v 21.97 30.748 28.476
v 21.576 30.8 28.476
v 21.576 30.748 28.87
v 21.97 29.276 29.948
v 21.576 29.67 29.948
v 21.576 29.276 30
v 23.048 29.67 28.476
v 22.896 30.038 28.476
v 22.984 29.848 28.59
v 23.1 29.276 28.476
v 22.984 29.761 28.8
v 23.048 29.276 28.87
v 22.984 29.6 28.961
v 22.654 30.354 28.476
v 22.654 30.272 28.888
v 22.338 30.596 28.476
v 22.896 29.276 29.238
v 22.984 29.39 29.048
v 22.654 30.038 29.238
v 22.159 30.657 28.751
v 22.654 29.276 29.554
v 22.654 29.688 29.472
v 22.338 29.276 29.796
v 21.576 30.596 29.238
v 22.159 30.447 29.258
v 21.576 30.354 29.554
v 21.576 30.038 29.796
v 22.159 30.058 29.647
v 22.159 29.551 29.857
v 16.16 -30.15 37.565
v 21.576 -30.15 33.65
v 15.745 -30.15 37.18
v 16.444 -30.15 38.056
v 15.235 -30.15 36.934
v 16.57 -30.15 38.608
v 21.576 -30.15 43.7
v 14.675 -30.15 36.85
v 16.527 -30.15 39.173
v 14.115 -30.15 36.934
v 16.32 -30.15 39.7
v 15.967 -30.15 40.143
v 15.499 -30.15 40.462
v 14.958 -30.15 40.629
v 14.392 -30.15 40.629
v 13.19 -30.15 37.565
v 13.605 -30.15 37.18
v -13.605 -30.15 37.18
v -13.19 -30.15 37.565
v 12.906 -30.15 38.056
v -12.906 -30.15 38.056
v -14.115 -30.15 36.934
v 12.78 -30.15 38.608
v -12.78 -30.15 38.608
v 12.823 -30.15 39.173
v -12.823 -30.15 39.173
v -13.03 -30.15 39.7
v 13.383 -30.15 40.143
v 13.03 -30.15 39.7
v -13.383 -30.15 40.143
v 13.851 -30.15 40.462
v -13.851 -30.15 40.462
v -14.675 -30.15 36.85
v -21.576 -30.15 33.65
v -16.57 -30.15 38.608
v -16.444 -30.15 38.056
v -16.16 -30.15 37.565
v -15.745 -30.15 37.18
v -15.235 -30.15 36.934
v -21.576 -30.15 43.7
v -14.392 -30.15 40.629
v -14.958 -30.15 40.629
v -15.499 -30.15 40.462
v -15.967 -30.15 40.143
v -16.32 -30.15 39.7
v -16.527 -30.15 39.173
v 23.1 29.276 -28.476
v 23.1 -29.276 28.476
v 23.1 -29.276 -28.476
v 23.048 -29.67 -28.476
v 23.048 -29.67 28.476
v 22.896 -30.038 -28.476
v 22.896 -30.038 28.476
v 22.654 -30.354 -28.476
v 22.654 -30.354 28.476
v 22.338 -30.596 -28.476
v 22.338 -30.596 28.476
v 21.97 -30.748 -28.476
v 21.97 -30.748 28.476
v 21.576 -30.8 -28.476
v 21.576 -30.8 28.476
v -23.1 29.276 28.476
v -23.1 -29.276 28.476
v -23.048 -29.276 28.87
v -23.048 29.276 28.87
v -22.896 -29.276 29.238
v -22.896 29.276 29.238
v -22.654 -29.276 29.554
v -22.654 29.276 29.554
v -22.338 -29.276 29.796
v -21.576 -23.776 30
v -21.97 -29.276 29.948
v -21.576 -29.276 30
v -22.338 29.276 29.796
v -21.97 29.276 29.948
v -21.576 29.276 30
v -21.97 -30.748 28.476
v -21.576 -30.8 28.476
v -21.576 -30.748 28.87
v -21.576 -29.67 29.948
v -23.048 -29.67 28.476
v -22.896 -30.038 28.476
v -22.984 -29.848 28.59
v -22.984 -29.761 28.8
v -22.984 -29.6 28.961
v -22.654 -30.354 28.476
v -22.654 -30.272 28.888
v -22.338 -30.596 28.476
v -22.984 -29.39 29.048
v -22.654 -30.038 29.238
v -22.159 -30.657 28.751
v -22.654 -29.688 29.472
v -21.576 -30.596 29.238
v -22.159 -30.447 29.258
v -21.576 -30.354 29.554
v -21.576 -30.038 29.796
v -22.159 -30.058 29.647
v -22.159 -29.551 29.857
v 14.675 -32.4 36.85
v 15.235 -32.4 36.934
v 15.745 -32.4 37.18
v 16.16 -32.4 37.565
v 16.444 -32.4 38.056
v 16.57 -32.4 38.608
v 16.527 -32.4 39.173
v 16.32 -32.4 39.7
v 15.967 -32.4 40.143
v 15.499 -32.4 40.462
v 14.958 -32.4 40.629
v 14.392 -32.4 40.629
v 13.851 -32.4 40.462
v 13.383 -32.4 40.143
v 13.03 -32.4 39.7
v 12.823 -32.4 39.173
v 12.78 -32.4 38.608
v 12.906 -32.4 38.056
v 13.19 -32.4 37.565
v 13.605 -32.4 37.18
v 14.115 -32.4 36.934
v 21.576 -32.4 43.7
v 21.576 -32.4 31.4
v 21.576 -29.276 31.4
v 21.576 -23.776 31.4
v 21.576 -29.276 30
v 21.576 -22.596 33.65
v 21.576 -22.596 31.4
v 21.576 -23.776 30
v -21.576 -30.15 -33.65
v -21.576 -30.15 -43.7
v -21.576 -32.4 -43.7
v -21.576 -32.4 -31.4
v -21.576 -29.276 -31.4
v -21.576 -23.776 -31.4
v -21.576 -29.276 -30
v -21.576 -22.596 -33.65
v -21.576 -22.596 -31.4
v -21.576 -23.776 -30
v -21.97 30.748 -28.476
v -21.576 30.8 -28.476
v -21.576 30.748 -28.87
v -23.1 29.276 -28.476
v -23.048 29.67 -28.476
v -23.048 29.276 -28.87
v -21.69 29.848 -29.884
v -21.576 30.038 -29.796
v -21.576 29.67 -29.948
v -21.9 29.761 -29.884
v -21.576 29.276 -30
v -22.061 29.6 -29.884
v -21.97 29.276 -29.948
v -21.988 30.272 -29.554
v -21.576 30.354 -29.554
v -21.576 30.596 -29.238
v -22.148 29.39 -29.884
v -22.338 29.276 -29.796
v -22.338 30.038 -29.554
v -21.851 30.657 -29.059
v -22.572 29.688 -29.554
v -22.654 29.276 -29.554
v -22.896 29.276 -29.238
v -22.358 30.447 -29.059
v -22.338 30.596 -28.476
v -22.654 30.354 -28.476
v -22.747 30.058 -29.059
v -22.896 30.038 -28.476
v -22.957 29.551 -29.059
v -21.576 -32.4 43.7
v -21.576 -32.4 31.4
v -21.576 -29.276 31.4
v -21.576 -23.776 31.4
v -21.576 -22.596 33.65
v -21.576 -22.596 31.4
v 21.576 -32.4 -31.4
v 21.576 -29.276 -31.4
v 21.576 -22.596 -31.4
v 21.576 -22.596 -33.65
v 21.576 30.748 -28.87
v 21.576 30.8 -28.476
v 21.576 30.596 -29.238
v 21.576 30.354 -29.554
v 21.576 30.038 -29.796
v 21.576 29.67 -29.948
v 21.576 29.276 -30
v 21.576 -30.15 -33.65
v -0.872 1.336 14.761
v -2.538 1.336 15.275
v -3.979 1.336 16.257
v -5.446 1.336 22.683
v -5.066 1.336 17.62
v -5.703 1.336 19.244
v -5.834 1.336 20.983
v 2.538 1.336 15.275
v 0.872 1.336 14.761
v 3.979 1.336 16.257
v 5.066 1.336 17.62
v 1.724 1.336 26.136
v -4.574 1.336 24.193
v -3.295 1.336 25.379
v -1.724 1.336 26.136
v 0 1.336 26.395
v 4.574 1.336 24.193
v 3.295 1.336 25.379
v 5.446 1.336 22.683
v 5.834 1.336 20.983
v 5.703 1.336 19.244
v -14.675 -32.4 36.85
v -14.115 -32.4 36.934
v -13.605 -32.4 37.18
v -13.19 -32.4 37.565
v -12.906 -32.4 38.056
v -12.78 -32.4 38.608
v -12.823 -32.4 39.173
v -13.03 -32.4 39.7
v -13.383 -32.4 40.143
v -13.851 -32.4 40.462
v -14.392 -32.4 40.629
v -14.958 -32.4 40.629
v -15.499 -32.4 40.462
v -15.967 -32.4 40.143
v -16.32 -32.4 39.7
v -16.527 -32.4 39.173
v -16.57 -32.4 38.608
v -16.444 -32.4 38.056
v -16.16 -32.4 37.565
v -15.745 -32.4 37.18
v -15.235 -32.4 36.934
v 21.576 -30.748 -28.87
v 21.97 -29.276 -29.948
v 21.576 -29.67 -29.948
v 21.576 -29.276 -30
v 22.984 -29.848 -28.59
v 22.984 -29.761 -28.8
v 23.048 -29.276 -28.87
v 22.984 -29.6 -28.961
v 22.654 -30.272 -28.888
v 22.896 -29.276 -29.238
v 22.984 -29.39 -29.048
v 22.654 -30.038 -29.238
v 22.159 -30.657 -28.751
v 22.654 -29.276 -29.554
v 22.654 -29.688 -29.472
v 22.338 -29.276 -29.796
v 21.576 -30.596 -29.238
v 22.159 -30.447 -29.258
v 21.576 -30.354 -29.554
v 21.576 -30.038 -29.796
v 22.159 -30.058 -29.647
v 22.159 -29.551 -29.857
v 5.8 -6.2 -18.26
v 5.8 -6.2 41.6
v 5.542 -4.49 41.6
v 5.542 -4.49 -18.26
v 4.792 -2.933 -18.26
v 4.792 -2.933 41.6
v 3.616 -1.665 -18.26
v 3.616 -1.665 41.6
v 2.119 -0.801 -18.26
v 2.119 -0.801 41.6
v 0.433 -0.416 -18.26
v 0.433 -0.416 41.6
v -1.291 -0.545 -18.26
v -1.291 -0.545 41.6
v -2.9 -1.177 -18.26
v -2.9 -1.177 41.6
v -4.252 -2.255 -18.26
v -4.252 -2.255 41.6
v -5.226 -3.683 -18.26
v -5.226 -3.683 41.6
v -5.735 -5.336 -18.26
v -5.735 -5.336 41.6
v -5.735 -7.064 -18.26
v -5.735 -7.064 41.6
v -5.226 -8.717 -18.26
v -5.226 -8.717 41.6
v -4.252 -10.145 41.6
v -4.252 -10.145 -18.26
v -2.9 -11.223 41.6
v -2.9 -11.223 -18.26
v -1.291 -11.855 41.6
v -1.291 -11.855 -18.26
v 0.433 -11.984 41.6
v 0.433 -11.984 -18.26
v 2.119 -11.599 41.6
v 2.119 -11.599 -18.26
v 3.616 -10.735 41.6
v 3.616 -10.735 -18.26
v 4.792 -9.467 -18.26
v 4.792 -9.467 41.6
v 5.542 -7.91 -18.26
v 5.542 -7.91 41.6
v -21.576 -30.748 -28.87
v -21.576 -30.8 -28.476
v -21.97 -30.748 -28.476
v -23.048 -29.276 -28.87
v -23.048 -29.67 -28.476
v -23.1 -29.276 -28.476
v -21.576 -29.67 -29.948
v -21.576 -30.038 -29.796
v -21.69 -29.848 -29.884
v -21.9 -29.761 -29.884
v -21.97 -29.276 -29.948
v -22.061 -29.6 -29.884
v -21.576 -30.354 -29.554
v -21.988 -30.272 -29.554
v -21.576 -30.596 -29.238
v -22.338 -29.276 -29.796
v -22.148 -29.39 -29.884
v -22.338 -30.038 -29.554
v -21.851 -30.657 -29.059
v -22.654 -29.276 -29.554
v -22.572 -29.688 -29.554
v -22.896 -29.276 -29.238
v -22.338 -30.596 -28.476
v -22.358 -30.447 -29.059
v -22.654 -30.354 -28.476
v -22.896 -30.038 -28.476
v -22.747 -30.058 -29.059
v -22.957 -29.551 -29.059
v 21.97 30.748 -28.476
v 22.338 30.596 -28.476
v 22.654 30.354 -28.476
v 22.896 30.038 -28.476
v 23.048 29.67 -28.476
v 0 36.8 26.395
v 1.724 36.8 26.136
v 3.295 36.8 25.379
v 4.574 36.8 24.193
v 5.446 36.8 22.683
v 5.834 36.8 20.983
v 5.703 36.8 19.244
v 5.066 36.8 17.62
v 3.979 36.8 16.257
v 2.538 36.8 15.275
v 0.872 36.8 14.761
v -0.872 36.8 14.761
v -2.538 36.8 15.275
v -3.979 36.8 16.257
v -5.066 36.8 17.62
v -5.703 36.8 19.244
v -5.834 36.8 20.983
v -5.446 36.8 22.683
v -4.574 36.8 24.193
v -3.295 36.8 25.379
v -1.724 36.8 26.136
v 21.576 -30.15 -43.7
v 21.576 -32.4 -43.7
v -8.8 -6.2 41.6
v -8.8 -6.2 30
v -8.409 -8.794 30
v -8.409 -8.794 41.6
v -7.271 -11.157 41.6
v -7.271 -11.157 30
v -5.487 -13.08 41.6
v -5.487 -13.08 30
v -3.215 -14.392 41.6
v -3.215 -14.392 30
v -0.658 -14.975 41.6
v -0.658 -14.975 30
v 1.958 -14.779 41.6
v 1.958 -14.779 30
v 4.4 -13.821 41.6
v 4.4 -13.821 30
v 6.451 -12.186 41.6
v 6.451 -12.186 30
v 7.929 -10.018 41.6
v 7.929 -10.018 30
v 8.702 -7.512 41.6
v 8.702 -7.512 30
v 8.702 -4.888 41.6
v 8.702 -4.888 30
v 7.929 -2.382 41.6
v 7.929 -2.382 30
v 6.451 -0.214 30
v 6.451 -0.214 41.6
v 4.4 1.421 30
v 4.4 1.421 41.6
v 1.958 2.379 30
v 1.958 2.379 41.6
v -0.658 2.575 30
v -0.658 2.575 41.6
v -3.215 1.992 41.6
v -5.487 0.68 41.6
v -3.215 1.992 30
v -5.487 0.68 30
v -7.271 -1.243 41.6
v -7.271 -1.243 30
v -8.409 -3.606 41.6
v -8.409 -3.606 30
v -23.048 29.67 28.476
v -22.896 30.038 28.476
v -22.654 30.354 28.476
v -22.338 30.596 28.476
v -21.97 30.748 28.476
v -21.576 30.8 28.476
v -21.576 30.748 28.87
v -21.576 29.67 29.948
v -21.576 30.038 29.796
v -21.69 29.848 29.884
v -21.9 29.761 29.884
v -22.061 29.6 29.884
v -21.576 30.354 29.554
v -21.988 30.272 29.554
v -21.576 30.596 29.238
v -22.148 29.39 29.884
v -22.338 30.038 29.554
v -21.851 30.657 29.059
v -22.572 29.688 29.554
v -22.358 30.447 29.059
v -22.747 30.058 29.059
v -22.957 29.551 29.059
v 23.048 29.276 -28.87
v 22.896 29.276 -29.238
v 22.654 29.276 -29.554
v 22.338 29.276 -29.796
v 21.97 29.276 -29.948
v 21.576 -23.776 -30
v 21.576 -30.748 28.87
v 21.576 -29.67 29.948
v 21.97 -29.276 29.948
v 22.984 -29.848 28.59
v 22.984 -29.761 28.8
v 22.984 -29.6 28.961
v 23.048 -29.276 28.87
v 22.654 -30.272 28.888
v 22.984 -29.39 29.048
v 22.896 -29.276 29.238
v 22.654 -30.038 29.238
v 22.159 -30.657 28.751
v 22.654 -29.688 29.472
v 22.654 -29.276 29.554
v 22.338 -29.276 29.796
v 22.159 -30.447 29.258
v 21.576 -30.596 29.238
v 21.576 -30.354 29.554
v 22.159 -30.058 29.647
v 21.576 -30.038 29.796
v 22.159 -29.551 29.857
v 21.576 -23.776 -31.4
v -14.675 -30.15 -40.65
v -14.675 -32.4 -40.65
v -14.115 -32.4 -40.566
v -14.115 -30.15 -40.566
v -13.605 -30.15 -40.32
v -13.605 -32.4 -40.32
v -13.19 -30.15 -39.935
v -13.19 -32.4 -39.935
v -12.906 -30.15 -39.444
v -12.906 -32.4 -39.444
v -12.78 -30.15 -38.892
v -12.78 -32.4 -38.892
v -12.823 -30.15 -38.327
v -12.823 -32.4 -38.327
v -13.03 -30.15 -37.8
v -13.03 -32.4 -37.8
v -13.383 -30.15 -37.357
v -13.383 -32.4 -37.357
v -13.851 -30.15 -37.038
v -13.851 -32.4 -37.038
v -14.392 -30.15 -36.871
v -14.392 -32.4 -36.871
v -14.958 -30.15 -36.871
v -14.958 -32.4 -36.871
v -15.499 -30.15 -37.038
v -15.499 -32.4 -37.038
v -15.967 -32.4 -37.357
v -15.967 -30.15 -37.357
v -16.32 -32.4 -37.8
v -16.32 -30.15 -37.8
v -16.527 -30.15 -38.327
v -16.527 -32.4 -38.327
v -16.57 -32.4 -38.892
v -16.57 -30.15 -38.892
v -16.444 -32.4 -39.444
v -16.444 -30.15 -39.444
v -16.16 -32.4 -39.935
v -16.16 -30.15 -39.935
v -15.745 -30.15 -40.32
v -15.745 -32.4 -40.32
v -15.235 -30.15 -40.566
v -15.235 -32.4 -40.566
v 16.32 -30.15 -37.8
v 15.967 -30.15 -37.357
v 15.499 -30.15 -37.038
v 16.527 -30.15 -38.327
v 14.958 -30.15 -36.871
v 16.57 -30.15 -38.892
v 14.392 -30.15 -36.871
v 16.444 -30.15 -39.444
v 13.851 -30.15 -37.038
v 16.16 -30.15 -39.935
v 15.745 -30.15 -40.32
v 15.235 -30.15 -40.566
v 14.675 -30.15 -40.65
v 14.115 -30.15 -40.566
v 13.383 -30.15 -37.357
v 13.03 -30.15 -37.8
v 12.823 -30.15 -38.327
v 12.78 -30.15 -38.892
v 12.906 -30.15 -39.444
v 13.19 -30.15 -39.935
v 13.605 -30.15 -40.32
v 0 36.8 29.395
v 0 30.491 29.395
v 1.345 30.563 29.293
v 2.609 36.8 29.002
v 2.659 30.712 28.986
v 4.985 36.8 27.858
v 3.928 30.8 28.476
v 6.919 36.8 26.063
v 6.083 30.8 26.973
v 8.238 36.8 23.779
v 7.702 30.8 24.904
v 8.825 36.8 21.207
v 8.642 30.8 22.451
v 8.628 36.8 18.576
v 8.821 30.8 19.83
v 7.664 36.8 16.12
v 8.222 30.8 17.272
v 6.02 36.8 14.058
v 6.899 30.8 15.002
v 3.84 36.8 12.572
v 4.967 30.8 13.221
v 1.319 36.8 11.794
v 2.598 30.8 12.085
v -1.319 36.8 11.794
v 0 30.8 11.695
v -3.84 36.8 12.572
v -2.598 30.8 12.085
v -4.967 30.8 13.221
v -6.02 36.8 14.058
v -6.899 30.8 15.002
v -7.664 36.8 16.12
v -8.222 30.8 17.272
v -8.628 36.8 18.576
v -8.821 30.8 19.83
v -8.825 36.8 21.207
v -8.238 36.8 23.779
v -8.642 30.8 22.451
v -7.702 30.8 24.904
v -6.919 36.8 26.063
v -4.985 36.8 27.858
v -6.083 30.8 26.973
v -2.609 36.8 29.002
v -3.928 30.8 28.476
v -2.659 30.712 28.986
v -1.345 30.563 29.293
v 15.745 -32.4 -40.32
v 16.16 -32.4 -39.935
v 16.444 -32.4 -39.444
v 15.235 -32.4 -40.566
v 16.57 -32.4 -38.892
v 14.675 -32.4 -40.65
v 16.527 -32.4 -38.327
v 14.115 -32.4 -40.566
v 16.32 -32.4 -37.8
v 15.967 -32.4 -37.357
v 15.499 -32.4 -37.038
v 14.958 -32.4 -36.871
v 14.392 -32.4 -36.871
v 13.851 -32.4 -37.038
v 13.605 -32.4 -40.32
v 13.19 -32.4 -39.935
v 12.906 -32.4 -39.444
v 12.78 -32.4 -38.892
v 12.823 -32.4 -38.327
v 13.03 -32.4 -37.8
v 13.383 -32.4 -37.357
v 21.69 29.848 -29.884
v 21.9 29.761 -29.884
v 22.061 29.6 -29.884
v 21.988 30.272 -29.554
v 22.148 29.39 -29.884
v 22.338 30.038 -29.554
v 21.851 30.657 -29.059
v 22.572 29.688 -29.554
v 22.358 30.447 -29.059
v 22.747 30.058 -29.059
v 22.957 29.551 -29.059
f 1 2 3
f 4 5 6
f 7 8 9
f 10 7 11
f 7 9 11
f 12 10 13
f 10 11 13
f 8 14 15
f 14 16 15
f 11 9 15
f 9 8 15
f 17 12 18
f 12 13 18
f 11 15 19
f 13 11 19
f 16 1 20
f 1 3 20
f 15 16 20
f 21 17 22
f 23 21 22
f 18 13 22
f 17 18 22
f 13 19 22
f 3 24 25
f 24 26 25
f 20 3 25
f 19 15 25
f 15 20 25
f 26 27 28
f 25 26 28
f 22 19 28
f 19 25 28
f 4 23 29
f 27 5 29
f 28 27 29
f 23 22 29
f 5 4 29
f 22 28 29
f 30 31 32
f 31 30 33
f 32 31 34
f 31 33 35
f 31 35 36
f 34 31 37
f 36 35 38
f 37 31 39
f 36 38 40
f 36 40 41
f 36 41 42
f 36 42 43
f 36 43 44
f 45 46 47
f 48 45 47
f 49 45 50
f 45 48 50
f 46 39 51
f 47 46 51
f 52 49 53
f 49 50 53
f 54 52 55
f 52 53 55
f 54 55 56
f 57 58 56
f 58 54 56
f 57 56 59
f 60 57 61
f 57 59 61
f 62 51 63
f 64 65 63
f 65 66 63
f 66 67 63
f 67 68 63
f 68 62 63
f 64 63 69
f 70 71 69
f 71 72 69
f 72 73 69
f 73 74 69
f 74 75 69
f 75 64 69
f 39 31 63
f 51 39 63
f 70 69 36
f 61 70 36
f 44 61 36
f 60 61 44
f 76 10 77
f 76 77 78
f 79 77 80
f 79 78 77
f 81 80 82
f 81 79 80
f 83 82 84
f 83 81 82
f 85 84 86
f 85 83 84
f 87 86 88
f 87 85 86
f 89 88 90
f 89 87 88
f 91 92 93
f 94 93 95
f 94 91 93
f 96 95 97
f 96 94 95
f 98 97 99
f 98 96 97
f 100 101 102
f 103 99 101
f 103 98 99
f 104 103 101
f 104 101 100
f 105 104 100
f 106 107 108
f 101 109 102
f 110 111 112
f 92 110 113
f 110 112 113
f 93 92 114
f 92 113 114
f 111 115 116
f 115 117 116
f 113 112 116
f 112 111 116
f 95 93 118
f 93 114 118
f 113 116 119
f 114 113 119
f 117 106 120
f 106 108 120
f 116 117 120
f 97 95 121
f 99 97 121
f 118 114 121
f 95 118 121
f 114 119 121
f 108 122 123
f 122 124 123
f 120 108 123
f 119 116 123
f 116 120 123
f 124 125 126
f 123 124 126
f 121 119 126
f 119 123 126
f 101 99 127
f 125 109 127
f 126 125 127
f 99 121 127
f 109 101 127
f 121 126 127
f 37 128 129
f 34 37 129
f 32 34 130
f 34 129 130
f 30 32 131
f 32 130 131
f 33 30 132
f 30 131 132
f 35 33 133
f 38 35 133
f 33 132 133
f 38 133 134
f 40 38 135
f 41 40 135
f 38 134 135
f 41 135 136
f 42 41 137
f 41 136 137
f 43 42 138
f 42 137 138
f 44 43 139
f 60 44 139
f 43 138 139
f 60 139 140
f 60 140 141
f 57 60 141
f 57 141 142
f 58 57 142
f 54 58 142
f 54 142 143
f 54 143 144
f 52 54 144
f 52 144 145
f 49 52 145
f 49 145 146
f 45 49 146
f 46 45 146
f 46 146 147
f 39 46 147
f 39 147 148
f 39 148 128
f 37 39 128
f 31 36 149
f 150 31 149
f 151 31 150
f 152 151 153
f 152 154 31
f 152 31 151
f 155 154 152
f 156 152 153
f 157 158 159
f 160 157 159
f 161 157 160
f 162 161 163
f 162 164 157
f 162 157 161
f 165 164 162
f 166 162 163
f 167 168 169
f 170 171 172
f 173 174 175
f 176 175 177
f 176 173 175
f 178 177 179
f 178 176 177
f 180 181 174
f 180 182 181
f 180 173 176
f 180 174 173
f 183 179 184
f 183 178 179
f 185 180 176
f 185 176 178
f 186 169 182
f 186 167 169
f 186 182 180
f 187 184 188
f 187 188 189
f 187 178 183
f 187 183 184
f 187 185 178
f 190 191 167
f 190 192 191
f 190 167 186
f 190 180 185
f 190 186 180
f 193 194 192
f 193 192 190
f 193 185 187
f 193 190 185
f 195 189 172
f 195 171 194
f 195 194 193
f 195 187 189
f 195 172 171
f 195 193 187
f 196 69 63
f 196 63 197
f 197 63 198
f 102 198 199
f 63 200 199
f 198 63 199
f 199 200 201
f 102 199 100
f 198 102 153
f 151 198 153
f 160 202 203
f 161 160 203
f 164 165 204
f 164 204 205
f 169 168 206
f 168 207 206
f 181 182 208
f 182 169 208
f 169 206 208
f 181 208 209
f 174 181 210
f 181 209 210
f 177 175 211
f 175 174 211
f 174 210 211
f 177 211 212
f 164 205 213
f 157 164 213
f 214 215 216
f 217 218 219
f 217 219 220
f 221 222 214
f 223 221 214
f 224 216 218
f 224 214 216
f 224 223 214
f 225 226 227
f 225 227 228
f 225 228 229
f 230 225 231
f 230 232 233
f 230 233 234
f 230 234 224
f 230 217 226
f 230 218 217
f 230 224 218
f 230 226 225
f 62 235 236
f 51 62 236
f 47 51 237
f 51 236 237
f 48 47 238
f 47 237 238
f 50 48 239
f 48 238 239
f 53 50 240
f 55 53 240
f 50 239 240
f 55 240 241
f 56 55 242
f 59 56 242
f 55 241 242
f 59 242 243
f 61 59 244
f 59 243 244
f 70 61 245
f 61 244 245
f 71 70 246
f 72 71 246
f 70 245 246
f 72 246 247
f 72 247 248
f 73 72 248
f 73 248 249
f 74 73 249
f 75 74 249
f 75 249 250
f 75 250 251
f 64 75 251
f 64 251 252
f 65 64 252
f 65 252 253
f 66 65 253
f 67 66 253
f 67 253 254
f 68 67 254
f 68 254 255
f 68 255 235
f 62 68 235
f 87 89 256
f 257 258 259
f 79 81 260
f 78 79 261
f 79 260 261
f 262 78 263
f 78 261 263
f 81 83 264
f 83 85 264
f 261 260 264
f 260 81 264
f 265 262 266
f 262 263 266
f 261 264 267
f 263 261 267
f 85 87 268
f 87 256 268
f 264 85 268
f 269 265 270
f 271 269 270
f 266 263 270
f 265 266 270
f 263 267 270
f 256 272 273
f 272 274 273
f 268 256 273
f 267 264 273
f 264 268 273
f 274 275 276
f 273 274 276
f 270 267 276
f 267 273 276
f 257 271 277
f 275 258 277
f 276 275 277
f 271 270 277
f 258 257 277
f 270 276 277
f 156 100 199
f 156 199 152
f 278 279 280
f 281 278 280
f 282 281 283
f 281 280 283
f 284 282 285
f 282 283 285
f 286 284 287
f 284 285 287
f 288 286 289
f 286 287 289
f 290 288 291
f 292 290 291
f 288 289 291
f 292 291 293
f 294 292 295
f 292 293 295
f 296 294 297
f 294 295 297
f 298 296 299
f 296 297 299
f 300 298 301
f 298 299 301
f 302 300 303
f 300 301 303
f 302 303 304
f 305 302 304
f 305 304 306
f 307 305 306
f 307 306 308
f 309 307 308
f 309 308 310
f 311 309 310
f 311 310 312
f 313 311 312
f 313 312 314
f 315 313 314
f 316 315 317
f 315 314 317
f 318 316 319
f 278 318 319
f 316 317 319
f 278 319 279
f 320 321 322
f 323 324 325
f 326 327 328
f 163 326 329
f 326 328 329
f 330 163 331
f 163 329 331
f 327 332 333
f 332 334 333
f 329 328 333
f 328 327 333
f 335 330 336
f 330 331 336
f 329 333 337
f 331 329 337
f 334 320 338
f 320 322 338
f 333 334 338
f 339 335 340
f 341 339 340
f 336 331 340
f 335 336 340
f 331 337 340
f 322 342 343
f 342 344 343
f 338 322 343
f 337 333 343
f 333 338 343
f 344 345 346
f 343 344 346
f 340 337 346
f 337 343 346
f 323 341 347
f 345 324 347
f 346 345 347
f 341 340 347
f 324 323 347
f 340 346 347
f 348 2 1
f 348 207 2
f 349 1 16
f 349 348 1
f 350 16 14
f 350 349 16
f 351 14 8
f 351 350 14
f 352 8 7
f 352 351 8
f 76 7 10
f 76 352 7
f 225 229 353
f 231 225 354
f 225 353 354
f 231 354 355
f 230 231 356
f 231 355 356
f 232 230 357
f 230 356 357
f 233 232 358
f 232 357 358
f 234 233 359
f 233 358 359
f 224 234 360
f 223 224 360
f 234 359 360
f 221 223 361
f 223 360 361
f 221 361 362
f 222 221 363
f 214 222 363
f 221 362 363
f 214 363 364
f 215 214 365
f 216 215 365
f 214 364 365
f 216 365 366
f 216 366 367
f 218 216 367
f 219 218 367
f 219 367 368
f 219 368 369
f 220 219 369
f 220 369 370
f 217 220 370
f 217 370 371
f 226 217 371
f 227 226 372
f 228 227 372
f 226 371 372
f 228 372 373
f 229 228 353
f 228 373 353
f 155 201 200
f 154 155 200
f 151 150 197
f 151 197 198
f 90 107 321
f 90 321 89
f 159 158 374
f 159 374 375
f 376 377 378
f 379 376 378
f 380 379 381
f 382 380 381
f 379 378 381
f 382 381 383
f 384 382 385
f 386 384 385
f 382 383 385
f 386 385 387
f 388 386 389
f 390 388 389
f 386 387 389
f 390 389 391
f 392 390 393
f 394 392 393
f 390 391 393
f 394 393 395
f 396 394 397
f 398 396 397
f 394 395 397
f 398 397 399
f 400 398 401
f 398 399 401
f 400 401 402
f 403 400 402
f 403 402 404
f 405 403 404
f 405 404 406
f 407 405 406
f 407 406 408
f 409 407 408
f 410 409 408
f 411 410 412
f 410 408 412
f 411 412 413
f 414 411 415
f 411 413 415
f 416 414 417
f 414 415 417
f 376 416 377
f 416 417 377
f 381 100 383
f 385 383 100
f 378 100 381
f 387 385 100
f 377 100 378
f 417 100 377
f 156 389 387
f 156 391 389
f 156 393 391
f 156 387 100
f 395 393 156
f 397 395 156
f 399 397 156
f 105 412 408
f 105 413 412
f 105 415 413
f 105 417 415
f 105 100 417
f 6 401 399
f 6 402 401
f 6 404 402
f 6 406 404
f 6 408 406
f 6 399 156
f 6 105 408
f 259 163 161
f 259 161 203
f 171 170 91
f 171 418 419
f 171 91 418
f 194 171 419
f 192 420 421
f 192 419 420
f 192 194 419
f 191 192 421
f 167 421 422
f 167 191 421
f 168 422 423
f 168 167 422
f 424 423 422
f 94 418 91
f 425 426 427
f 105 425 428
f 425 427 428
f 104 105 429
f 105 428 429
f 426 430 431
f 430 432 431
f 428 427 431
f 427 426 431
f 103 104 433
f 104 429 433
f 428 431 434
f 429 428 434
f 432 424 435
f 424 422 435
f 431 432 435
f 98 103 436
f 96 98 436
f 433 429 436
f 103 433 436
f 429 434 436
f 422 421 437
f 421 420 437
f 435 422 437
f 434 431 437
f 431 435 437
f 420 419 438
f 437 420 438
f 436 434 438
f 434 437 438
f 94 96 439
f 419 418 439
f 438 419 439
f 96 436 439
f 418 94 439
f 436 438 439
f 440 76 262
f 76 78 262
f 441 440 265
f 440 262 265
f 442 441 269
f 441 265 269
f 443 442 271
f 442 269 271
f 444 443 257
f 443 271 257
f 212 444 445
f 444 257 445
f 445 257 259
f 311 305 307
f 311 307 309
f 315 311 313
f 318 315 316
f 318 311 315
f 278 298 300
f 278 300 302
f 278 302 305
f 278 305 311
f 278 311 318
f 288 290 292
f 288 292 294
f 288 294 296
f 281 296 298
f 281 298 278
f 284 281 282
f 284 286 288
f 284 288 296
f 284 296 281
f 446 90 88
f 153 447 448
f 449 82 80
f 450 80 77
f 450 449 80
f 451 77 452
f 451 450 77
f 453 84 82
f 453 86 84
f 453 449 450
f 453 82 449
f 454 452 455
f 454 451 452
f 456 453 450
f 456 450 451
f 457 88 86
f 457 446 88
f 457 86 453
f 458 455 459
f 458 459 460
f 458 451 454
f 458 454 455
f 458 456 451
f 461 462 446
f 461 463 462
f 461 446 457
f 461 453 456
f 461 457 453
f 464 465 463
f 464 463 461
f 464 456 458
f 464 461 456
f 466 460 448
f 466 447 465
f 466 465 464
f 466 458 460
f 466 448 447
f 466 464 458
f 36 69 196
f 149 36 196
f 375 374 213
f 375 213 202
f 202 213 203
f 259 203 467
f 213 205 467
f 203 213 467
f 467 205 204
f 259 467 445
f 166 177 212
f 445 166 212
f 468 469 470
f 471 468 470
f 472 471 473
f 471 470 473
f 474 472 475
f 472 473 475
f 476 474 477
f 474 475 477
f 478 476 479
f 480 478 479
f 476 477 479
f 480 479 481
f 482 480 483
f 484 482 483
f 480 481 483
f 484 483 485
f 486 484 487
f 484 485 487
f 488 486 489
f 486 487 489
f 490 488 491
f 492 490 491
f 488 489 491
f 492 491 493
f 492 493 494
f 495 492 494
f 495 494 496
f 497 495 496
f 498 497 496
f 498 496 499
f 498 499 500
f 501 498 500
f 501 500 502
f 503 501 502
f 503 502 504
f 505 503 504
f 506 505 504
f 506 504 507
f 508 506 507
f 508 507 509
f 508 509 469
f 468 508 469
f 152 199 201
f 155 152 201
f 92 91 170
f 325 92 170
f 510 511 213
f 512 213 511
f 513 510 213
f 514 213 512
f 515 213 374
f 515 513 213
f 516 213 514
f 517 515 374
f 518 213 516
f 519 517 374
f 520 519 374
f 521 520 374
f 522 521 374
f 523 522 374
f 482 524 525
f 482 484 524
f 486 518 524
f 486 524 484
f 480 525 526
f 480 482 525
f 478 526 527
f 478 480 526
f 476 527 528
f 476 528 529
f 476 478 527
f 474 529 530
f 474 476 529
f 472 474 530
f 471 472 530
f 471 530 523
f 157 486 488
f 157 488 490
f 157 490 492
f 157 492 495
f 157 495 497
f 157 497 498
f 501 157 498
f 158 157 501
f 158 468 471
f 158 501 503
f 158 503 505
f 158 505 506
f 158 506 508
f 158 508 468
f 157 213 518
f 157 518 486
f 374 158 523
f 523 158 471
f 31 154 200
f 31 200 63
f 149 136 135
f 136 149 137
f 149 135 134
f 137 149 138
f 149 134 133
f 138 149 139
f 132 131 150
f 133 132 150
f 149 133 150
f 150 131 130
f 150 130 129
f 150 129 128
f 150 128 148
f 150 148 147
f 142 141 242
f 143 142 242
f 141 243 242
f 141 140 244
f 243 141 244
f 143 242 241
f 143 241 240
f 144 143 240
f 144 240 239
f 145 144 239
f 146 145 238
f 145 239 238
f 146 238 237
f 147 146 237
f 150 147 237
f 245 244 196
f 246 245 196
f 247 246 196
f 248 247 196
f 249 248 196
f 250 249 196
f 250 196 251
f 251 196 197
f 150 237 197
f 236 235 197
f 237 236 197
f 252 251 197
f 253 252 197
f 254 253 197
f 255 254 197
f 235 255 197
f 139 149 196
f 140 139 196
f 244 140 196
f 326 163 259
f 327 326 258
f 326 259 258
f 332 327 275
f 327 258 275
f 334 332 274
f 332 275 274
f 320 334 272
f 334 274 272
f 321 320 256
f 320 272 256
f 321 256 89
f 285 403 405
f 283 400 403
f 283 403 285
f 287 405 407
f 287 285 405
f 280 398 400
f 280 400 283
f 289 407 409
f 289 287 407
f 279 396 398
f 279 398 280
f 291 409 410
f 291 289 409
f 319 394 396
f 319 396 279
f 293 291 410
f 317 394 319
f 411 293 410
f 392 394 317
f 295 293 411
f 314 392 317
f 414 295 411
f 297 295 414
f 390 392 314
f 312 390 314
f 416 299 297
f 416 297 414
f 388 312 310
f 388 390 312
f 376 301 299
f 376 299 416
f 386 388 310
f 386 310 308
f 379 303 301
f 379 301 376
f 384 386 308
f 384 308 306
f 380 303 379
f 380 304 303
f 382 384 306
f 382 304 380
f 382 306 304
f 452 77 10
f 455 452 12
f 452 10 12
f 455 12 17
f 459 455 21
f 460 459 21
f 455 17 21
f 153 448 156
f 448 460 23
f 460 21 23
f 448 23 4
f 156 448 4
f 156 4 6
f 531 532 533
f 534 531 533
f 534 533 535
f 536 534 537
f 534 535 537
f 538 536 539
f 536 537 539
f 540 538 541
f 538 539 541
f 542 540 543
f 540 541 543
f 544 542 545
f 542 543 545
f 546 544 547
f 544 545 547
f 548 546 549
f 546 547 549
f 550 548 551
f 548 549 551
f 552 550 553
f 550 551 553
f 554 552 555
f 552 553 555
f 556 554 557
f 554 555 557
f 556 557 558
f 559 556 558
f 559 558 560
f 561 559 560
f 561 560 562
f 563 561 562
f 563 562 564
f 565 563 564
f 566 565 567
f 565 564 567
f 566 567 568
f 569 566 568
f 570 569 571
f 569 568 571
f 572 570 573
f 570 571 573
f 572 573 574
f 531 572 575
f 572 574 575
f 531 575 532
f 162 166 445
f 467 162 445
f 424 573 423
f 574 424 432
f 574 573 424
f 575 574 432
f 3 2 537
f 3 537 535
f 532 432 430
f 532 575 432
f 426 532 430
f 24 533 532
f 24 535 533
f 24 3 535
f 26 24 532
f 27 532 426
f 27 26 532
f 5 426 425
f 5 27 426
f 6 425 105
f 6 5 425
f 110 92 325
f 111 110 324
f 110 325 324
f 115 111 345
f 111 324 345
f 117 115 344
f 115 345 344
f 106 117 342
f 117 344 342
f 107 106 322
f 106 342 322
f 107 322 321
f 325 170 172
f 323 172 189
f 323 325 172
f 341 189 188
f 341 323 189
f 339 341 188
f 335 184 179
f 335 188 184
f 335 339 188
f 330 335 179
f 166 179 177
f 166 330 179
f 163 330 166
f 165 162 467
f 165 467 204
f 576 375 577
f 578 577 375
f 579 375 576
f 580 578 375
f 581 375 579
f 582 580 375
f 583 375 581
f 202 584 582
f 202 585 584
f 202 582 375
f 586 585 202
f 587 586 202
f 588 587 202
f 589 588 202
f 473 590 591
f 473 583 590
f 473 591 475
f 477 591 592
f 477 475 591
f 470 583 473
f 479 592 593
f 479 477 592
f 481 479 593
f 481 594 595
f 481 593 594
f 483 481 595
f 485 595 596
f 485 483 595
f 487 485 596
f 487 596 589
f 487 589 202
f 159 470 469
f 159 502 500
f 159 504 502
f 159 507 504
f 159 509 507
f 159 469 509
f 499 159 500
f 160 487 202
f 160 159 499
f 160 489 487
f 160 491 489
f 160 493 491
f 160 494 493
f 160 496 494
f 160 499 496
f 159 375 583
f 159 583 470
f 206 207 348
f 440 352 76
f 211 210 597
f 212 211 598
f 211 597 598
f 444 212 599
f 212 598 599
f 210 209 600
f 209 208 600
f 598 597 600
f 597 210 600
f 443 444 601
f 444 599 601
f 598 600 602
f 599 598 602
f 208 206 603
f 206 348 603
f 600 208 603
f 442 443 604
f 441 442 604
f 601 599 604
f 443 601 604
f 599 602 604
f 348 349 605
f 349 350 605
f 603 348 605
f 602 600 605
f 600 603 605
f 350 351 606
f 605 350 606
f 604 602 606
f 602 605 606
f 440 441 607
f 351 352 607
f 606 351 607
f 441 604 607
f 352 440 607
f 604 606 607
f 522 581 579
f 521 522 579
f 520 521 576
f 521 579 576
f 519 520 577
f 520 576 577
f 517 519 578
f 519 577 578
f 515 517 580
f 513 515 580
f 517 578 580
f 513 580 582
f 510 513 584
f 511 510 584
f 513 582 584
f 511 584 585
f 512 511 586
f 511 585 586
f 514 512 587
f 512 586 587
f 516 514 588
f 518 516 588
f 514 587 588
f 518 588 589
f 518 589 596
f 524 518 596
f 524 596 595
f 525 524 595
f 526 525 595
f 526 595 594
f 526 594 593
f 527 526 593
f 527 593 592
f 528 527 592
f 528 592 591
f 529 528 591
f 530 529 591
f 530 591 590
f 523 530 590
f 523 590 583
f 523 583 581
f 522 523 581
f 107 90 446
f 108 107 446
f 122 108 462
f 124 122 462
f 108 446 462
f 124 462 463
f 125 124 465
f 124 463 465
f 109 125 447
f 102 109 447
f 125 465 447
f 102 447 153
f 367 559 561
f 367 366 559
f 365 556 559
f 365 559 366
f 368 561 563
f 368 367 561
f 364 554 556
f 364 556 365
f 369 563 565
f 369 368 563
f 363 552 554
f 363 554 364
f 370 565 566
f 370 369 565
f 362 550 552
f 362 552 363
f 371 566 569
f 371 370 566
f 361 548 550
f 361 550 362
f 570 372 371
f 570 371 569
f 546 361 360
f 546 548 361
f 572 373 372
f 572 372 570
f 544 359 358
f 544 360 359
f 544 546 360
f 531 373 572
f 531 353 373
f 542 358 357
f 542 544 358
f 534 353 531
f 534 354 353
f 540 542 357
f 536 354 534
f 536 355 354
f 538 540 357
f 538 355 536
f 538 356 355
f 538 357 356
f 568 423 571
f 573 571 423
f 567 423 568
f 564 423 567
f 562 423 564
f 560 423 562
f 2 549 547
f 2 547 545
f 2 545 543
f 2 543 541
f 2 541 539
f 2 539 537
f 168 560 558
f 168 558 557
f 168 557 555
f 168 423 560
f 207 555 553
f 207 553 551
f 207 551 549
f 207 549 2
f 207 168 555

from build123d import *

# Parameters (mm, degrees)
SKETCH1_W                = 46.2
SKETCH1_H                = 60
BOSS_EXTRUDE1_DEPTH      = 30.8
FILLET1_R                = 1.524
BOSS_EXTRUDE2_DEPTH      = 6
BOSS_EXTRUDE2_DEPTH_BACK = 12.07
SKETCH2_R                = 8.849999953
SKETCH3_R                = 5.849999953
CUT_EXTRUDE1_DEPTH       = 35.464
SKETCH4_R                = 8.8
BOSS_EXTRUDE3_DEPTH      = 11.6
SKETCH5_R                = 5.8
CUT_EXTRUDE2_DEPTH       = 59.86
SKETCH6_W                = 43.152
SKETCH6_H                = 5.5
BOSS_EXTRUDE4_DEPTH      = 1.4
BOSS_EXTRUDE5_DEPTH      = 43.152
SKETCH9_R                = 1.9
CUT_EXTRUDE3_DEPTH       = 14.1


with BuildPart() as part:
    # Sketch1 → Boss-Extrude1 (new, symmetric)
    with BuildSketch(Plane(origin=(0, 0, 0), x_dir=(1, 0, 0), z_dir=(0, 1, 0))):
        Rectangle(SKETCH1_W, SKETCH1_H)
    extrude(amount=BOSS_EXTRUDE1_DEPTH, both=True)

    # Fillet1
    fillet1_edges = [part.edges().sort_by_distance(p)[0] for p in [
        (-23.1, 30.8, 0),
        (0, 30.8, 30),
        (23.1, 30.8, 0),
        (0, -30.8, 30),
        (-23.1, -30.8, 0),
        (0, -30.8, -30),
        (23.1, -30.8, 0),
        (0, 30.8, -30),
        (23.1, 0, 30),
        (-23.1, 0, 30),
        (-23.1, 0, -30),
        (23.1, 0, -30),
    ]]
    fillet(fillet1_edges, radius=FILLET1_R)

    # Sketch2 → Boss-Extrude2 (add, two sides: drawn at the far end of the back side and taken through both)
    with BuildSketch(Plane(origin=(0, 30.8, 0), x_dir=(1, 0, 0), z_dir=(0, 1, 0)).offset(-BOSS_EXTRUDE2_DEPTH_BACK)):
        with Locations(Location((0, -20.545484859, 0), (0, 0, 270))):
            Circle(SKETCH2_R)
    extrude(amount=BOSS_EXTRUDE2_DEPTH + BOSS_EXTRUDE2_DEPTH_BACK)

    # Sketch3 → Cut-Extrude1 (cut)
    with BuildSketch(Plane(origin=(0, 36.8, 0), x_dir=(1, 0, 0), z_dir=(0, 1, 0))):
        with Locations(Location((0, -20.545484859, 0), (0, 0, 270))):
            Circle(SKETCH3_R)
    extrude(amount=-CUT_EXTRUDE1_DEPTH, mode=Mode.SUBTRACT)

    # Sketch4 → Boss-Extrude3 (add)
    with BuildSketch(Plane.XY.offset(30)):
        with Locations(Location((0, -6.2, 0), (0, 0, 180))):
            Circle(SKETCH4_R)
    extrude(amount=BOSS_EXTRUDE3_DEPTH)

    # Sketch5 → Cut-Extrude2 (cut)
    with BuildSketch(Plane.XY.offset(41.6)):
        with Locations((0, -6.2)):
            Circle(SKETCH5_R)
    extrude(amount=-CUT_EXTRUDE2_DEPTH, mode=Mode.SUBTRACT)

    # Sketch6 → Boss-Extrude4 (add)
    with BuildSketch(Plane.XY.offset(30)):
        with Locations((0, -26.526)):
            Rectangle(SKETCH6_W, SKETCH6_H)
    boss_extrude4 = extrude(amount=BOSS_EXTRUDE4_DEPTH)

    # Sketch8 → Boss-Extrude5 (add)
    with BuildSketch(Plane.ZY.offset(21.576)):
        Polygon((31.4, -32.4), (31.4, -22.595531019), (33.65, -22.595531019), (33.65, -30.15), (43.7, -30.15), (43.7, -32.4), align=None)
    boss_extrude5 = extrude(amount=-BOSS_EXTRUDE5_DEPTH)

    # Mirror1: Boss-Extrude4, Boss-Extrude5 across plane
    add(boss_extrude4.mirror(Plane.XY))
    add(boss_extrude5.mirror(Plane.XY))

    # Sketch9 → Cut-Extrude3 (cut)
    with BuildSketch(Plane.XZ.offset(32.4)):
        with Locations(Location((-14.675, 38.75, 0), (0, 0, 270))):
            Circle(SKETCH9_R)
        with Locations(Location((14.675, 38.75, 0), (0, 0, 270))):
            Circle(SKETCH9_R)
        with Locations(Location((14.675, -38.75, 0), (0, 0, 270))):
            Circle(SKETCH9_R)
        with Locations(Location((-14.675, -38.75, 0), (0, 0, 270))):
            Circle(SKETCH9_R)
    extrude(amount=-CUT_EXTRUDE3_DEPTH, mode=Mode.SUBTRACT)


solid = part.part
